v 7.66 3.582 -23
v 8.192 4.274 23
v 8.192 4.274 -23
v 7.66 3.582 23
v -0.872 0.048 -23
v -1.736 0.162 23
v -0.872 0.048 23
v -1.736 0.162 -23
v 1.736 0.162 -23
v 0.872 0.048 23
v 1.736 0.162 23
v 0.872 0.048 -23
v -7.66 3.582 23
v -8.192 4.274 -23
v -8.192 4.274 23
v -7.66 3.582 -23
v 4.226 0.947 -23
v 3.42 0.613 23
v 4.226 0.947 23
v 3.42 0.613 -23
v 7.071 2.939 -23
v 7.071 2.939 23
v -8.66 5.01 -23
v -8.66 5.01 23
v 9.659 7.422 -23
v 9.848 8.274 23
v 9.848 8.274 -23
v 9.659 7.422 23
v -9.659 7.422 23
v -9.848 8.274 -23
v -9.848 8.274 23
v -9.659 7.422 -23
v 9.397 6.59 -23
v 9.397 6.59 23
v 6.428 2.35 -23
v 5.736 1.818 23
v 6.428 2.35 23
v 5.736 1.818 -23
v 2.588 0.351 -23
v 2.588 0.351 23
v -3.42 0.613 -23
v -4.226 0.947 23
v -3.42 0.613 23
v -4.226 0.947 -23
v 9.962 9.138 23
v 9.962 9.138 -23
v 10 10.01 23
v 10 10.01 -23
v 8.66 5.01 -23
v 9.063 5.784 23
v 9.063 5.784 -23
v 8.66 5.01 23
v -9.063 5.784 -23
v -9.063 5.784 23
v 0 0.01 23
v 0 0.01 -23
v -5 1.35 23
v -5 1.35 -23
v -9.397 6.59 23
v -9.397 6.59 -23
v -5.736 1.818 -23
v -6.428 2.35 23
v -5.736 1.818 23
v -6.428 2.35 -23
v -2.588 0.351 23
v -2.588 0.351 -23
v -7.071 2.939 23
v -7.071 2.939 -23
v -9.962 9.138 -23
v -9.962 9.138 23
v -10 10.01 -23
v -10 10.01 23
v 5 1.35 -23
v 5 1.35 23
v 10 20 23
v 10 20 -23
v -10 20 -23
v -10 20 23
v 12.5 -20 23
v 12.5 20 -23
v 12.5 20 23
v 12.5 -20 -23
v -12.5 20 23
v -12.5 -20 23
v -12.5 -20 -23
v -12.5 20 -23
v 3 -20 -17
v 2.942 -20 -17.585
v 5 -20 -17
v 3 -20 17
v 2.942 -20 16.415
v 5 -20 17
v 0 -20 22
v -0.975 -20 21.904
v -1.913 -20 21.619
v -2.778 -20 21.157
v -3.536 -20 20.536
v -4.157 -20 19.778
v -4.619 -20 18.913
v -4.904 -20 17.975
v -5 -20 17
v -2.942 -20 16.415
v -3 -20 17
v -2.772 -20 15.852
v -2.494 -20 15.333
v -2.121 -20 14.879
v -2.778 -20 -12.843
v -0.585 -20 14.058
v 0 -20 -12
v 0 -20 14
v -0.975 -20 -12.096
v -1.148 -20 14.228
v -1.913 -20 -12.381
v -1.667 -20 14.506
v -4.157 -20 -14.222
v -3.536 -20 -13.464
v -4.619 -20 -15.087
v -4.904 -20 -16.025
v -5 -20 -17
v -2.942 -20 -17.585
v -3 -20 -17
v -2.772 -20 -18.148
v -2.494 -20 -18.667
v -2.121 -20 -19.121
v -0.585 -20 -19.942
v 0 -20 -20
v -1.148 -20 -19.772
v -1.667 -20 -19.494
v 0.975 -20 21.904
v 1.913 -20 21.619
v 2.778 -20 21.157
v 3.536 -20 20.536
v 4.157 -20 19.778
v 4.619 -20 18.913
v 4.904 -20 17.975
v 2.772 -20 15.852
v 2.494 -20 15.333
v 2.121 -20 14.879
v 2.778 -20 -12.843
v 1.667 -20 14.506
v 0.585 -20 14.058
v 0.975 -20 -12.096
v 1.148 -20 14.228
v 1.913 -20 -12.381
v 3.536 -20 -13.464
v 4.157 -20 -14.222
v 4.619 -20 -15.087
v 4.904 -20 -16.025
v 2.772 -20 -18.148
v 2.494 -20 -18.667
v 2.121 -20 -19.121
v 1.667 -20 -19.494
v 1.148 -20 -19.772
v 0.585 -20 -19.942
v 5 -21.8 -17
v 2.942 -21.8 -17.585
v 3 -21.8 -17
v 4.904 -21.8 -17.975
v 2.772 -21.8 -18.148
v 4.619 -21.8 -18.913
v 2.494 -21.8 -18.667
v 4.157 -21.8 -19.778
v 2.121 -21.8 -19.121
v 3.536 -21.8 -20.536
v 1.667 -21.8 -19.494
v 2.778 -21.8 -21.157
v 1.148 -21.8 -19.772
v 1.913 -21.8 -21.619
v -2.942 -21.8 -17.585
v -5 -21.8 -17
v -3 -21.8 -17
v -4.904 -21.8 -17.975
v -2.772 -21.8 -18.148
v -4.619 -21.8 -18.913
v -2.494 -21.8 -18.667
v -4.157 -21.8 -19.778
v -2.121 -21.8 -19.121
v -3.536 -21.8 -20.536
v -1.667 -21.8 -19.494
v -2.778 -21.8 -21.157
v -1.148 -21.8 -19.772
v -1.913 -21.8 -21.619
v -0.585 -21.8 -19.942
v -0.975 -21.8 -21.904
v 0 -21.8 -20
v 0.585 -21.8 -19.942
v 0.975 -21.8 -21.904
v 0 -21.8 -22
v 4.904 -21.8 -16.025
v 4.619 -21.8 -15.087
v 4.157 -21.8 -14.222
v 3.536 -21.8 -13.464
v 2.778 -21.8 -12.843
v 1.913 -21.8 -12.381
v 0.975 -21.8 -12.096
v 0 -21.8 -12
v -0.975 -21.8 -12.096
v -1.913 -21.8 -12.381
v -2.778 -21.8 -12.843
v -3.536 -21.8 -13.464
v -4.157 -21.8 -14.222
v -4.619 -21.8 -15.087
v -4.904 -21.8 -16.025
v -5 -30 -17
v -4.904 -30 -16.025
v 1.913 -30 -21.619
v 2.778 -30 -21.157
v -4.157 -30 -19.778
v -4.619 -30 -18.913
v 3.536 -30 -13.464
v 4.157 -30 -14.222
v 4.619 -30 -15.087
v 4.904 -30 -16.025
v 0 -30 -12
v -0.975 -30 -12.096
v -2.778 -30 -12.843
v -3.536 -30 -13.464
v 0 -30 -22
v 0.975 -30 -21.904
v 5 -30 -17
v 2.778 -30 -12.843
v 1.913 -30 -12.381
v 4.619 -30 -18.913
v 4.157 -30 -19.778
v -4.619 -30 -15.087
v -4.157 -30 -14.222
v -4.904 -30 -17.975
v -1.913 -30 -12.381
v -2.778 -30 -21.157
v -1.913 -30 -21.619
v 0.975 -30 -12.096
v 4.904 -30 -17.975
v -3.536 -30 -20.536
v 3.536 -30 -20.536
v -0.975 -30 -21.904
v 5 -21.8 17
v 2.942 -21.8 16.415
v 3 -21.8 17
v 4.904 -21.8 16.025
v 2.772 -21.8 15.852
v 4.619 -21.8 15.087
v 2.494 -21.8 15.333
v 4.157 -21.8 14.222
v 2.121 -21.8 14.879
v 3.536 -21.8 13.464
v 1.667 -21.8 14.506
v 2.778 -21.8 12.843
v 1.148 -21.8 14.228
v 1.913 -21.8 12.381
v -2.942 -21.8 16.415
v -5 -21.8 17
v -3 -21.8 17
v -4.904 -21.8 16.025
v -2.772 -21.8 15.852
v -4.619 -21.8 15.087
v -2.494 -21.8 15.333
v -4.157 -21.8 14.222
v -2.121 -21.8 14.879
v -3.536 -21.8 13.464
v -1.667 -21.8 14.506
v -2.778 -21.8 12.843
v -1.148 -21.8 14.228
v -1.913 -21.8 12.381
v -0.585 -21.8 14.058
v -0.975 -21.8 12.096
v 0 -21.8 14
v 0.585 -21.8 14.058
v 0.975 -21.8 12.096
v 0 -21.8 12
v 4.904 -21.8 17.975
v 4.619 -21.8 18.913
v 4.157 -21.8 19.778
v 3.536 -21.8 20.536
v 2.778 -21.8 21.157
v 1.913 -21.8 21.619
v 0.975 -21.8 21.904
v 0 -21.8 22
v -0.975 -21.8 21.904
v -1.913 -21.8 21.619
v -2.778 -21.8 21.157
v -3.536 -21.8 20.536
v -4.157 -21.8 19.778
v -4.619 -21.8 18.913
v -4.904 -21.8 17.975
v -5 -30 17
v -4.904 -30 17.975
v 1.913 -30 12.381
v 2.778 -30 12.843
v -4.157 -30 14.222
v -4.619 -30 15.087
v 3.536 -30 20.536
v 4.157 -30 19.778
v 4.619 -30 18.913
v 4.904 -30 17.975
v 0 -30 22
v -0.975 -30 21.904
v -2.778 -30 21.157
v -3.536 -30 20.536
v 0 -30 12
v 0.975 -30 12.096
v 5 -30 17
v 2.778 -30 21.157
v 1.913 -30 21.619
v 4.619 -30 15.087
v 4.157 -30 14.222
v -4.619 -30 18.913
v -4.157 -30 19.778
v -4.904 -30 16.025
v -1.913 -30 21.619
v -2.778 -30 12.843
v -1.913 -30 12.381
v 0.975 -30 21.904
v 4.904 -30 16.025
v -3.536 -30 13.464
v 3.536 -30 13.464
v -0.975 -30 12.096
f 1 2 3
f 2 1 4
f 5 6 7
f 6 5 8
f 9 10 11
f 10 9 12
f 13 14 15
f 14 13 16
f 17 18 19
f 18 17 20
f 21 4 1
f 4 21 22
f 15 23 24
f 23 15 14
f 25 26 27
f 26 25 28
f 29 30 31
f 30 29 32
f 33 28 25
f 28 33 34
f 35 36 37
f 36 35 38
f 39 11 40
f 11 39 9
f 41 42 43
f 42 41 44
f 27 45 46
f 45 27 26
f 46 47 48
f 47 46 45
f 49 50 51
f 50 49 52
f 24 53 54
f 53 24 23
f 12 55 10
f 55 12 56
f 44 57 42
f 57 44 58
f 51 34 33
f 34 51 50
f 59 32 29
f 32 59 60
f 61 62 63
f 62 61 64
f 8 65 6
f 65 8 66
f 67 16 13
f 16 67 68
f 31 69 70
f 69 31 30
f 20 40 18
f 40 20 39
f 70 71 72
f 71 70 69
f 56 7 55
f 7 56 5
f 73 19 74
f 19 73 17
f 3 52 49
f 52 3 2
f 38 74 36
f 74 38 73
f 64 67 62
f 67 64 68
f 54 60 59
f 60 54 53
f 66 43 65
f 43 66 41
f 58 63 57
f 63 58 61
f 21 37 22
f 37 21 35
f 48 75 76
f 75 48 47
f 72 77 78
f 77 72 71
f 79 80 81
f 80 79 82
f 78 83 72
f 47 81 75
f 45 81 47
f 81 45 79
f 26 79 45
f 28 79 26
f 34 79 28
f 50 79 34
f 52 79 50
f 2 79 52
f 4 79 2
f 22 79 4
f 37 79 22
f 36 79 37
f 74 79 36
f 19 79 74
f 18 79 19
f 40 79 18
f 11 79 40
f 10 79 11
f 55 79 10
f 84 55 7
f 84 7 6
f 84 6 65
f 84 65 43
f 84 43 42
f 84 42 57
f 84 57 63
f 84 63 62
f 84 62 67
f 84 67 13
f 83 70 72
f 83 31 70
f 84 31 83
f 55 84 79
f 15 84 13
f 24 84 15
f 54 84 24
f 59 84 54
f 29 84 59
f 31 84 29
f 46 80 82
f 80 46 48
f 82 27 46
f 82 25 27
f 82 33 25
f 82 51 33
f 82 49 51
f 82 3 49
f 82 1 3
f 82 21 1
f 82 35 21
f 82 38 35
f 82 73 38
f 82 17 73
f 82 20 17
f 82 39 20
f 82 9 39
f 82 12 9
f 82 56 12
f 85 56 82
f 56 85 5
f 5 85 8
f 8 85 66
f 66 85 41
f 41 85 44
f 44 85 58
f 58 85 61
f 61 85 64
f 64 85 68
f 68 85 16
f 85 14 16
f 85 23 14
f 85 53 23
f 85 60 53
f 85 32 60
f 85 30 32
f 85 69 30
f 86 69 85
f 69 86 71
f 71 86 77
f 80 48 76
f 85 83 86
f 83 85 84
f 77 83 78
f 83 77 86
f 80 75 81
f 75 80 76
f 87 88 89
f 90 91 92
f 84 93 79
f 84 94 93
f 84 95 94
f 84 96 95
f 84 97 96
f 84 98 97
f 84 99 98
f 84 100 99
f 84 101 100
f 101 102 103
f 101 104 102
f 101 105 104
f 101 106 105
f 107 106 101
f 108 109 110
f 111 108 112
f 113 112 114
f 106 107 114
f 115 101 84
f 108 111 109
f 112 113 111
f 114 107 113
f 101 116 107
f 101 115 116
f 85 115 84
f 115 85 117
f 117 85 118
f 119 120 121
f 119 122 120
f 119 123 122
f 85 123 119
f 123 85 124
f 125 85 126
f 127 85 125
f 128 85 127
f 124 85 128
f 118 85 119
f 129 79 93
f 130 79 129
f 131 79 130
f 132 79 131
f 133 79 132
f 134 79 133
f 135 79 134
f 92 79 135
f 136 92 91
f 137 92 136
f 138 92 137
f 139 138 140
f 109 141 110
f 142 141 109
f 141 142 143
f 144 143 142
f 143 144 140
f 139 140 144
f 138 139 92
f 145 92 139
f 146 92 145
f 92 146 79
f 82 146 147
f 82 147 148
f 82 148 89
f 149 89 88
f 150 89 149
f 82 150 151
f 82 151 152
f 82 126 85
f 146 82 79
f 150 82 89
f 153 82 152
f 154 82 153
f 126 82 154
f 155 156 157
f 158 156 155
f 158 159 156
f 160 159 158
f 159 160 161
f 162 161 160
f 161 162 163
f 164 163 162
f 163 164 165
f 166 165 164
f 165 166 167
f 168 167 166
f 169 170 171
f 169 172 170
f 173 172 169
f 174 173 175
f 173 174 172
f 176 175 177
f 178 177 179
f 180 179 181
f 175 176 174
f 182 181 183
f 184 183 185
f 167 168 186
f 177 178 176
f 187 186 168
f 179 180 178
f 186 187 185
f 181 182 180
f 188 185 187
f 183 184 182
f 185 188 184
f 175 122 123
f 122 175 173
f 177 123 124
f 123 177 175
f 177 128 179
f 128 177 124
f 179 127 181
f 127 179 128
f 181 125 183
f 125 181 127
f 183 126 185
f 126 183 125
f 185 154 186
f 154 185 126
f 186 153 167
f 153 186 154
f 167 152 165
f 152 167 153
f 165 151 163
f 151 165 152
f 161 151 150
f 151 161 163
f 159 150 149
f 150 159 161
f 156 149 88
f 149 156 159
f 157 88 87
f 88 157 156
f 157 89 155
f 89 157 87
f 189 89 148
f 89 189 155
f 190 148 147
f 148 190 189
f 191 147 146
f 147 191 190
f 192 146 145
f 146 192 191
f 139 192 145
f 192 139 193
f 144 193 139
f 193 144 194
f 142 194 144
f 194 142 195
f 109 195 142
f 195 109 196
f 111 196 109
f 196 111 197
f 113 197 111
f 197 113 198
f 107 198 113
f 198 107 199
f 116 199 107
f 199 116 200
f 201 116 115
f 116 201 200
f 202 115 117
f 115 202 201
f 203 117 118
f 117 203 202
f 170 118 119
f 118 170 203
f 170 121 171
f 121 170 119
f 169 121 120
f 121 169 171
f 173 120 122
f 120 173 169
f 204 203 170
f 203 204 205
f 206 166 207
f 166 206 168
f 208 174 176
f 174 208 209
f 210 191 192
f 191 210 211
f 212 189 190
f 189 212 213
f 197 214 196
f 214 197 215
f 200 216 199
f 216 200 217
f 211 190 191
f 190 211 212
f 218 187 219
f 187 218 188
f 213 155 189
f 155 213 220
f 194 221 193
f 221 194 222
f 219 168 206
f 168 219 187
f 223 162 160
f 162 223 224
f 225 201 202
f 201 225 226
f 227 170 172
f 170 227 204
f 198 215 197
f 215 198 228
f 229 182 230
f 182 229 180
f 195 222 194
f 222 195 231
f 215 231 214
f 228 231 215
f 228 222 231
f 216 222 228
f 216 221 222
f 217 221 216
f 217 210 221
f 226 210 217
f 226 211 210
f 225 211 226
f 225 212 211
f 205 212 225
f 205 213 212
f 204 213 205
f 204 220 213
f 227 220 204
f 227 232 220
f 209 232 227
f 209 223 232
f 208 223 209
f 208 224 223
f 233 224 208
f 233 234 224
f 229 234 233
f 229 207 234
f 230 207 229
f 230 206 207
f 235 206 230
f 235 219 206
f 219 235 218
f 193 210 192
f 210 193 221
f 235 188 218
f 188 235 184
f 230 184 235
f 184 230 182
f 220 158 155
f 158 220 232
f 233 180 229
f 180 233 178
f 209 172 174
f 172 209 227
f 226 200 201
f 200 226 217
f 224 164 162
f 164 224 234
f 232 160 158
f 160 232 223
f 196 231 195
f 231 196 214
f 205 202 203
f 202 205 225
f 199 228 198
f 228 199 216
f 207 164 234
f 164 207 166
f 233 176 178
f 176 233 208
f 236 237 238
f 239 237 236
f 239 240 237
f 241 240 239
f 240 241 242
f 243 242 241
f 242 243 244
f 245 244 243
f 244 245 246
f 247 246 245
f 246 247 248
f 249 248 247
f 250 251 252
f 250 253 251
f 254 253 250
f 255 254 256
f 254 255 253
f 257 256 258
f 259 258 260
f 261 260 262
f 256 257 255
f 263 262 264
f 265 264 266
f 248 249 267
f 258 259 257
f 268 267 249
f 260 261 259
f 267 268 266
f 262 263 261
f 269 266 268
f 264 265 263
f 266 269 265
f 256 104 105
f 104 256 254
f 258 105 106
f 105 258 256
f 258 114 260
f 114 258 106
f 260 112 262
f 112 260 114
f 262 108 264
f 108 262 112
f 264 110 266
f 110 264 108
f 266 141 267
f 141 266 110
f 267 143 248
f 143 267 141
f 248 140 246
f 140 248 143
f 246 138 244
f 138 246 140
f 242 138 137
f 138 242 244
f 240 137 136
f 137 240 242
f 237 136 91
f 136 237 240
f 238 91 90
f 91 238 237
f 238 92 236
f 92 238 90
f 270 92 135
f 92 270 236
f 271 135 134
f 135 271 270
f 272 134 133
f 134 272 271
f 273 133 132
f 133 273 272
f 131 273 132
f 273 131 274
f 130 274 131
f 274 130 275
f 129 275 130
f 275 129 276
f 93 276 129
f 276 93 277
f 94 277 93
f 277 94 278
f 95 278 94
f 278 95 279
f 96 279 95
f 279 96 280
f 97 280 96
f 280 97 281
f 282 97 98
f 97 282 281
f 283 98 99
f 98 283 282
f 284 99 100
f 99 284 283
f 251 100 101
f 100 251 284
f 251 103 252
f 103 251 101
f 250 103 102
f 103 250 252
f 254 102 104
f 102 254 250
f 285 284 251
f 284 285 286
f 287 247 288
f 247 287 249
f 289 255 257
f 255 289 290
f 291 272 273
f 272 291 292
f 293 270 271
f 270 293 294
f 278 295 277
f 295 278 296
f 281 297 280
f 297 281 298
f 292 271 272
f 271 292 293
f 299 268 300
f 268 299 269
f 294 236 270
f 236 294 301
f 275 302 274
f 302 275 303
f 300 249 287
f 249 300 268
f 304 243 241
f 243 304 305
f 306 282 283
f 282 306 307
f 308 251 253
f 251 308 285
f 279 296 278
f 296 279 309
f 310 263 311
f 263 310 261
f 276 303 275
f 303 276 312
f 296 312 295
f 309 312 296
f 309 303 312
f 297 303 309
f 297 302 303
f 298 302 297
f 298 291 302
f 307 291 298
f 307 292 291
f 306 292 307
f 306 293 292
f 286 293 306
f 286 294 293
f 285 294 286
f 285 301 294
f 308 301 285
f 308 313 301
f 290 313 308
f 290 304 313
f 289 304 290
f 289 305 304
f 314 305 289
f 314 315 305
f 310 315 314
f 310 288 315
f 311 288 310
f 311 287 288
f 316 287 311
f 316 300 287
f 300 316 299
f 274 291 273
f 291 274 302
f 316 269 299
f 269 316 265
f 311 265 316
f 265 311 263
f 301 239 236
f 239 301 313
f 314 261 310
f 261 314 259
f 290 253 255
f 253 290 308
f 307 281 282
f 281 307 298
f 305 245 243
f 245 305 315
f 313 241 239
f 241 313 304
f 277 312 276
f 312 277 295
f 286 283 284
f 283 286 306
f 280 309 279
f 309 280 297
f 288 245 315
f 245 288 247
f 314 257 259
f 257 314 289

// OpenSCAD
// file: ../peg-base-plates/peg-base-plates.scad
// Metal peg board base plate reconstructed from exported 3MF models.
//
// Customizer surface:
// - columns
// - rows
// - plateThickness
//
// Reuse from another file with:
// use <peg-base-plates.scad>
// pegBasePlate(columnCount = 2, rowCount = 2, boardThickness = 2);

/* [Plate] */

// Number of peg columns.
columns = 4; // [1:1:8]

// Number of peg rows.
rows = 2; // [1:1:6]

// Thickness of the plate body in millimeters.
plateThickness = 2; // [1:0.1:5]

/* [Hidden] */

pegDiameter = 10;
notchDiameter = 6;
pegLength = 10;
notchHeight = 1.8;

columnPitch = 22;
rowPitch = 34;

pegSegments = 32;
plateSingleSpan = 14;
plateEdgeMargin = 6;
plateTwoRowHeight = 46;

function plateWidth(columnCount) = columnCount == 1 ? plateSingleSpan : (columnCount - 1) * columnPitch + plateEdgeMargin * 2;
function plateHeight(rowCount) = rowCount == 1 ? plateSingleSpan : rowCount == 2 ? plateTwoRowHeight : rowCount * rowPitch - 18;

function columnCenter(columnIndex, columnCount) = (columnIndex - (columnCount - 1) / 2) * columnPitch;
function rowCenter(rowIndex, rowCount) = (rowIndex - (rowCount - 1) / 2) * rowPitch;

// Peg profile measured from the exported model.
// The small keyed notch near the plate lets the peg flex during insertion.
module pegNotchProfile() {
    union() {
        intersection() {
            circle(d = pegDiameter, $fn = pegSegments);
            translate([-pegDiameter / 2, 0])
                square([pegDiameter, pegDiameter / 2]);
        }

        intersection() {
            circle(d = notchDiameter, $fn = pegSegments);
            translate([-notchDiameter / 2, -notchDiameter / 2])
                square([notchDiameter, notchDiameter / 2]);
        }
    }
}

// Single peg with a short keyed notch at the plate end.
module peg() {
    rotate([90, 0, 0])
        linear_extrude(height = notchHeight)
            pegNotchProfile();

    translate([0, -notchHeight, 0])
        rotate([90, 0, 0])
            cylinder(h = pegLength - notchHeight, d = pegDiameter, $fn = pegSegments);
}

// Reusable plate module.
// columnCount: number of peg columns.
// rowCount: number of peg rows.
// boardThickness: thickness of the rectangular plate body.
module pegBasePlate(columnCount = columns, rowCount = rows, boardThickness = plateThickness) {
    boardWidth = plateWidth(columnCount);
    boardHeight = plateHeight(rowCount);

    union() {
        cube([boardWidth, boardThickness, boardHeight], center = true);

        for (rowIndex = [0 : rowCount - 1]) {
            for (columnIndex = [0 : columnCount - 1]) {
                translate([
                    columnCenter(columnIndex, columnCount),
                    -boardThickness / 2,
                    rowCenter(rowIndex, rowCount)
                ])
                    peg();
            }
        }
    }
}

// Standalone render using the current customizer values.
pegBasePlate();
// main file
// Metal peg board long pole holder.
//
// Procedural reconstruction that does not depend on external mesh imports.

use <../peg-base-plates/peg-base-plates.scad>

/* [Holder] */

// Barrel diameter profile in millimeters.
barrelDiameterMm = 20; // [20:5:30]

// Holder spacing in millimeters.
spacingMm = 20; // [10:1:95]

// Enable magnetic holder variant where available.
useMagneticHolder = false;

// Only used for the 20mm, 10mm-spacing holder variant.
useShortHolder = false;

/* [Hidden] */

holderHeightDefault = 46;
holderHeightMagnetic = 40;
holderFn = 72;

magnetDiameter = 12;
magnetDepth = 3;
magnetPushoutDiameter = 3;

function holderWidth(diameter) = diameter * 1.25;
function holderDepth(diameter, spacing) = diameter + spacing;
function pegColumnCount(diameter) = diameter >= 30 ? 2 : 1;
function pegCenterX(columnIndex, diameter) = pegColumnCount(diameter) == 1 ? 0 : (columnIndex == 0 ? -11 : 11);
function pegCenterZ(rowIndex) = rowIndex == 0 ? -17 : 17;

module cradleCut(diameter, depth, height) {
    translate([0, depth / 2 - diameter / 2 + 0.01, 0]) {
        cylinder(h = height + 0.2, d = diameter, center = true, $fn = holderFn);

        // Open the lower half of the circular cut to create the front cradle mouth.
        translate([0, diameter / 4, 0])
            cube([diameter, diameter / 2, height + 0.2], center = true);
    }
}

module magneticHoles(depth, height) {
    magRadius = magnetDiameter / 2;
    stepSize = magRadius + 1;

    for (i = [0 : stepSize : height - magRadius * 3]) {
        offsetDirection = floor(i / stepSize) % 2 == 1 ? -1 : 1;

        translate([
            offsetDirection * magRadius,
            -(depth / 2 - magnetDepth / 2),
            i - (height / 2 - stepSize)
        ])
            rotate([90, 0, 0]) {
                cylinder(h = magnetDepth, r = magRadius, center = true, $fn = holderFn);

                // Push-through hole to recover press-fit magnets.
                translate([0, 0, -depth / 2])
                    cylinder(h = depth, d = magnetPushoutDiameter, center = true, $fn = holderFn / 2);
            }
    }
}

module backPegs(depth, diameter) {
    for (rowIndex = [0 : 1]) {
        for (columnIndex = [0 : pegColumnCount(diameter) - 1]) {
            translate([
                pegCenterX(columnIndex, diameter),
                -depth / 2,
                pegCenterZ(rowIndex)
            ])
                peg();
        }
    }
}

module longPoleHolder(diameter = barrelDiameterMm, spacing = spacingMm, magnetic = useMagneticHolder, shortHolder = useShortHolder) {
    if (!(diameter == 20 || diameter == 25 || diameter == 30)) {
        echo("Unsupported holder diameter", diameter);
    } else if (magnetic && !(diameter == 20 && spacing == 20)) {
        echo("Unsupported magnetic holder combination", diameter, spacing);
    } else if (!magnetic && diameter != 20 && spacing == 10) {
        echo("Unsupported non-magnetic holder combination", diameter, spacing);
    } else {
        width = holderWidth(diameter);
        depth = holderDepth(diameter, spacing);
        height = magnetic ? holderHeightMagnetic : holderHeightDefault;

        // Keep the short variant selectable for compatibility with existing presets.
        shortOffset = shortHolder ? 0 : 0;

        union() {
            difference() {
                translate([0, shortOffset, 0])
                    cube([width, depth, height], center = true);

                translate([0, shortOffset, 0])
                    cradleCut(diameter, depth, height);

                if (magnetic)
                    translate([0, shortOffset, 0])
                        magneticHoles(depth, height);
            }

            if (!magnetic)
                translate([0, shortOffset, 0])
                    backPegs(depth, diameter);
        }
    }
}

longPoleHolder();
